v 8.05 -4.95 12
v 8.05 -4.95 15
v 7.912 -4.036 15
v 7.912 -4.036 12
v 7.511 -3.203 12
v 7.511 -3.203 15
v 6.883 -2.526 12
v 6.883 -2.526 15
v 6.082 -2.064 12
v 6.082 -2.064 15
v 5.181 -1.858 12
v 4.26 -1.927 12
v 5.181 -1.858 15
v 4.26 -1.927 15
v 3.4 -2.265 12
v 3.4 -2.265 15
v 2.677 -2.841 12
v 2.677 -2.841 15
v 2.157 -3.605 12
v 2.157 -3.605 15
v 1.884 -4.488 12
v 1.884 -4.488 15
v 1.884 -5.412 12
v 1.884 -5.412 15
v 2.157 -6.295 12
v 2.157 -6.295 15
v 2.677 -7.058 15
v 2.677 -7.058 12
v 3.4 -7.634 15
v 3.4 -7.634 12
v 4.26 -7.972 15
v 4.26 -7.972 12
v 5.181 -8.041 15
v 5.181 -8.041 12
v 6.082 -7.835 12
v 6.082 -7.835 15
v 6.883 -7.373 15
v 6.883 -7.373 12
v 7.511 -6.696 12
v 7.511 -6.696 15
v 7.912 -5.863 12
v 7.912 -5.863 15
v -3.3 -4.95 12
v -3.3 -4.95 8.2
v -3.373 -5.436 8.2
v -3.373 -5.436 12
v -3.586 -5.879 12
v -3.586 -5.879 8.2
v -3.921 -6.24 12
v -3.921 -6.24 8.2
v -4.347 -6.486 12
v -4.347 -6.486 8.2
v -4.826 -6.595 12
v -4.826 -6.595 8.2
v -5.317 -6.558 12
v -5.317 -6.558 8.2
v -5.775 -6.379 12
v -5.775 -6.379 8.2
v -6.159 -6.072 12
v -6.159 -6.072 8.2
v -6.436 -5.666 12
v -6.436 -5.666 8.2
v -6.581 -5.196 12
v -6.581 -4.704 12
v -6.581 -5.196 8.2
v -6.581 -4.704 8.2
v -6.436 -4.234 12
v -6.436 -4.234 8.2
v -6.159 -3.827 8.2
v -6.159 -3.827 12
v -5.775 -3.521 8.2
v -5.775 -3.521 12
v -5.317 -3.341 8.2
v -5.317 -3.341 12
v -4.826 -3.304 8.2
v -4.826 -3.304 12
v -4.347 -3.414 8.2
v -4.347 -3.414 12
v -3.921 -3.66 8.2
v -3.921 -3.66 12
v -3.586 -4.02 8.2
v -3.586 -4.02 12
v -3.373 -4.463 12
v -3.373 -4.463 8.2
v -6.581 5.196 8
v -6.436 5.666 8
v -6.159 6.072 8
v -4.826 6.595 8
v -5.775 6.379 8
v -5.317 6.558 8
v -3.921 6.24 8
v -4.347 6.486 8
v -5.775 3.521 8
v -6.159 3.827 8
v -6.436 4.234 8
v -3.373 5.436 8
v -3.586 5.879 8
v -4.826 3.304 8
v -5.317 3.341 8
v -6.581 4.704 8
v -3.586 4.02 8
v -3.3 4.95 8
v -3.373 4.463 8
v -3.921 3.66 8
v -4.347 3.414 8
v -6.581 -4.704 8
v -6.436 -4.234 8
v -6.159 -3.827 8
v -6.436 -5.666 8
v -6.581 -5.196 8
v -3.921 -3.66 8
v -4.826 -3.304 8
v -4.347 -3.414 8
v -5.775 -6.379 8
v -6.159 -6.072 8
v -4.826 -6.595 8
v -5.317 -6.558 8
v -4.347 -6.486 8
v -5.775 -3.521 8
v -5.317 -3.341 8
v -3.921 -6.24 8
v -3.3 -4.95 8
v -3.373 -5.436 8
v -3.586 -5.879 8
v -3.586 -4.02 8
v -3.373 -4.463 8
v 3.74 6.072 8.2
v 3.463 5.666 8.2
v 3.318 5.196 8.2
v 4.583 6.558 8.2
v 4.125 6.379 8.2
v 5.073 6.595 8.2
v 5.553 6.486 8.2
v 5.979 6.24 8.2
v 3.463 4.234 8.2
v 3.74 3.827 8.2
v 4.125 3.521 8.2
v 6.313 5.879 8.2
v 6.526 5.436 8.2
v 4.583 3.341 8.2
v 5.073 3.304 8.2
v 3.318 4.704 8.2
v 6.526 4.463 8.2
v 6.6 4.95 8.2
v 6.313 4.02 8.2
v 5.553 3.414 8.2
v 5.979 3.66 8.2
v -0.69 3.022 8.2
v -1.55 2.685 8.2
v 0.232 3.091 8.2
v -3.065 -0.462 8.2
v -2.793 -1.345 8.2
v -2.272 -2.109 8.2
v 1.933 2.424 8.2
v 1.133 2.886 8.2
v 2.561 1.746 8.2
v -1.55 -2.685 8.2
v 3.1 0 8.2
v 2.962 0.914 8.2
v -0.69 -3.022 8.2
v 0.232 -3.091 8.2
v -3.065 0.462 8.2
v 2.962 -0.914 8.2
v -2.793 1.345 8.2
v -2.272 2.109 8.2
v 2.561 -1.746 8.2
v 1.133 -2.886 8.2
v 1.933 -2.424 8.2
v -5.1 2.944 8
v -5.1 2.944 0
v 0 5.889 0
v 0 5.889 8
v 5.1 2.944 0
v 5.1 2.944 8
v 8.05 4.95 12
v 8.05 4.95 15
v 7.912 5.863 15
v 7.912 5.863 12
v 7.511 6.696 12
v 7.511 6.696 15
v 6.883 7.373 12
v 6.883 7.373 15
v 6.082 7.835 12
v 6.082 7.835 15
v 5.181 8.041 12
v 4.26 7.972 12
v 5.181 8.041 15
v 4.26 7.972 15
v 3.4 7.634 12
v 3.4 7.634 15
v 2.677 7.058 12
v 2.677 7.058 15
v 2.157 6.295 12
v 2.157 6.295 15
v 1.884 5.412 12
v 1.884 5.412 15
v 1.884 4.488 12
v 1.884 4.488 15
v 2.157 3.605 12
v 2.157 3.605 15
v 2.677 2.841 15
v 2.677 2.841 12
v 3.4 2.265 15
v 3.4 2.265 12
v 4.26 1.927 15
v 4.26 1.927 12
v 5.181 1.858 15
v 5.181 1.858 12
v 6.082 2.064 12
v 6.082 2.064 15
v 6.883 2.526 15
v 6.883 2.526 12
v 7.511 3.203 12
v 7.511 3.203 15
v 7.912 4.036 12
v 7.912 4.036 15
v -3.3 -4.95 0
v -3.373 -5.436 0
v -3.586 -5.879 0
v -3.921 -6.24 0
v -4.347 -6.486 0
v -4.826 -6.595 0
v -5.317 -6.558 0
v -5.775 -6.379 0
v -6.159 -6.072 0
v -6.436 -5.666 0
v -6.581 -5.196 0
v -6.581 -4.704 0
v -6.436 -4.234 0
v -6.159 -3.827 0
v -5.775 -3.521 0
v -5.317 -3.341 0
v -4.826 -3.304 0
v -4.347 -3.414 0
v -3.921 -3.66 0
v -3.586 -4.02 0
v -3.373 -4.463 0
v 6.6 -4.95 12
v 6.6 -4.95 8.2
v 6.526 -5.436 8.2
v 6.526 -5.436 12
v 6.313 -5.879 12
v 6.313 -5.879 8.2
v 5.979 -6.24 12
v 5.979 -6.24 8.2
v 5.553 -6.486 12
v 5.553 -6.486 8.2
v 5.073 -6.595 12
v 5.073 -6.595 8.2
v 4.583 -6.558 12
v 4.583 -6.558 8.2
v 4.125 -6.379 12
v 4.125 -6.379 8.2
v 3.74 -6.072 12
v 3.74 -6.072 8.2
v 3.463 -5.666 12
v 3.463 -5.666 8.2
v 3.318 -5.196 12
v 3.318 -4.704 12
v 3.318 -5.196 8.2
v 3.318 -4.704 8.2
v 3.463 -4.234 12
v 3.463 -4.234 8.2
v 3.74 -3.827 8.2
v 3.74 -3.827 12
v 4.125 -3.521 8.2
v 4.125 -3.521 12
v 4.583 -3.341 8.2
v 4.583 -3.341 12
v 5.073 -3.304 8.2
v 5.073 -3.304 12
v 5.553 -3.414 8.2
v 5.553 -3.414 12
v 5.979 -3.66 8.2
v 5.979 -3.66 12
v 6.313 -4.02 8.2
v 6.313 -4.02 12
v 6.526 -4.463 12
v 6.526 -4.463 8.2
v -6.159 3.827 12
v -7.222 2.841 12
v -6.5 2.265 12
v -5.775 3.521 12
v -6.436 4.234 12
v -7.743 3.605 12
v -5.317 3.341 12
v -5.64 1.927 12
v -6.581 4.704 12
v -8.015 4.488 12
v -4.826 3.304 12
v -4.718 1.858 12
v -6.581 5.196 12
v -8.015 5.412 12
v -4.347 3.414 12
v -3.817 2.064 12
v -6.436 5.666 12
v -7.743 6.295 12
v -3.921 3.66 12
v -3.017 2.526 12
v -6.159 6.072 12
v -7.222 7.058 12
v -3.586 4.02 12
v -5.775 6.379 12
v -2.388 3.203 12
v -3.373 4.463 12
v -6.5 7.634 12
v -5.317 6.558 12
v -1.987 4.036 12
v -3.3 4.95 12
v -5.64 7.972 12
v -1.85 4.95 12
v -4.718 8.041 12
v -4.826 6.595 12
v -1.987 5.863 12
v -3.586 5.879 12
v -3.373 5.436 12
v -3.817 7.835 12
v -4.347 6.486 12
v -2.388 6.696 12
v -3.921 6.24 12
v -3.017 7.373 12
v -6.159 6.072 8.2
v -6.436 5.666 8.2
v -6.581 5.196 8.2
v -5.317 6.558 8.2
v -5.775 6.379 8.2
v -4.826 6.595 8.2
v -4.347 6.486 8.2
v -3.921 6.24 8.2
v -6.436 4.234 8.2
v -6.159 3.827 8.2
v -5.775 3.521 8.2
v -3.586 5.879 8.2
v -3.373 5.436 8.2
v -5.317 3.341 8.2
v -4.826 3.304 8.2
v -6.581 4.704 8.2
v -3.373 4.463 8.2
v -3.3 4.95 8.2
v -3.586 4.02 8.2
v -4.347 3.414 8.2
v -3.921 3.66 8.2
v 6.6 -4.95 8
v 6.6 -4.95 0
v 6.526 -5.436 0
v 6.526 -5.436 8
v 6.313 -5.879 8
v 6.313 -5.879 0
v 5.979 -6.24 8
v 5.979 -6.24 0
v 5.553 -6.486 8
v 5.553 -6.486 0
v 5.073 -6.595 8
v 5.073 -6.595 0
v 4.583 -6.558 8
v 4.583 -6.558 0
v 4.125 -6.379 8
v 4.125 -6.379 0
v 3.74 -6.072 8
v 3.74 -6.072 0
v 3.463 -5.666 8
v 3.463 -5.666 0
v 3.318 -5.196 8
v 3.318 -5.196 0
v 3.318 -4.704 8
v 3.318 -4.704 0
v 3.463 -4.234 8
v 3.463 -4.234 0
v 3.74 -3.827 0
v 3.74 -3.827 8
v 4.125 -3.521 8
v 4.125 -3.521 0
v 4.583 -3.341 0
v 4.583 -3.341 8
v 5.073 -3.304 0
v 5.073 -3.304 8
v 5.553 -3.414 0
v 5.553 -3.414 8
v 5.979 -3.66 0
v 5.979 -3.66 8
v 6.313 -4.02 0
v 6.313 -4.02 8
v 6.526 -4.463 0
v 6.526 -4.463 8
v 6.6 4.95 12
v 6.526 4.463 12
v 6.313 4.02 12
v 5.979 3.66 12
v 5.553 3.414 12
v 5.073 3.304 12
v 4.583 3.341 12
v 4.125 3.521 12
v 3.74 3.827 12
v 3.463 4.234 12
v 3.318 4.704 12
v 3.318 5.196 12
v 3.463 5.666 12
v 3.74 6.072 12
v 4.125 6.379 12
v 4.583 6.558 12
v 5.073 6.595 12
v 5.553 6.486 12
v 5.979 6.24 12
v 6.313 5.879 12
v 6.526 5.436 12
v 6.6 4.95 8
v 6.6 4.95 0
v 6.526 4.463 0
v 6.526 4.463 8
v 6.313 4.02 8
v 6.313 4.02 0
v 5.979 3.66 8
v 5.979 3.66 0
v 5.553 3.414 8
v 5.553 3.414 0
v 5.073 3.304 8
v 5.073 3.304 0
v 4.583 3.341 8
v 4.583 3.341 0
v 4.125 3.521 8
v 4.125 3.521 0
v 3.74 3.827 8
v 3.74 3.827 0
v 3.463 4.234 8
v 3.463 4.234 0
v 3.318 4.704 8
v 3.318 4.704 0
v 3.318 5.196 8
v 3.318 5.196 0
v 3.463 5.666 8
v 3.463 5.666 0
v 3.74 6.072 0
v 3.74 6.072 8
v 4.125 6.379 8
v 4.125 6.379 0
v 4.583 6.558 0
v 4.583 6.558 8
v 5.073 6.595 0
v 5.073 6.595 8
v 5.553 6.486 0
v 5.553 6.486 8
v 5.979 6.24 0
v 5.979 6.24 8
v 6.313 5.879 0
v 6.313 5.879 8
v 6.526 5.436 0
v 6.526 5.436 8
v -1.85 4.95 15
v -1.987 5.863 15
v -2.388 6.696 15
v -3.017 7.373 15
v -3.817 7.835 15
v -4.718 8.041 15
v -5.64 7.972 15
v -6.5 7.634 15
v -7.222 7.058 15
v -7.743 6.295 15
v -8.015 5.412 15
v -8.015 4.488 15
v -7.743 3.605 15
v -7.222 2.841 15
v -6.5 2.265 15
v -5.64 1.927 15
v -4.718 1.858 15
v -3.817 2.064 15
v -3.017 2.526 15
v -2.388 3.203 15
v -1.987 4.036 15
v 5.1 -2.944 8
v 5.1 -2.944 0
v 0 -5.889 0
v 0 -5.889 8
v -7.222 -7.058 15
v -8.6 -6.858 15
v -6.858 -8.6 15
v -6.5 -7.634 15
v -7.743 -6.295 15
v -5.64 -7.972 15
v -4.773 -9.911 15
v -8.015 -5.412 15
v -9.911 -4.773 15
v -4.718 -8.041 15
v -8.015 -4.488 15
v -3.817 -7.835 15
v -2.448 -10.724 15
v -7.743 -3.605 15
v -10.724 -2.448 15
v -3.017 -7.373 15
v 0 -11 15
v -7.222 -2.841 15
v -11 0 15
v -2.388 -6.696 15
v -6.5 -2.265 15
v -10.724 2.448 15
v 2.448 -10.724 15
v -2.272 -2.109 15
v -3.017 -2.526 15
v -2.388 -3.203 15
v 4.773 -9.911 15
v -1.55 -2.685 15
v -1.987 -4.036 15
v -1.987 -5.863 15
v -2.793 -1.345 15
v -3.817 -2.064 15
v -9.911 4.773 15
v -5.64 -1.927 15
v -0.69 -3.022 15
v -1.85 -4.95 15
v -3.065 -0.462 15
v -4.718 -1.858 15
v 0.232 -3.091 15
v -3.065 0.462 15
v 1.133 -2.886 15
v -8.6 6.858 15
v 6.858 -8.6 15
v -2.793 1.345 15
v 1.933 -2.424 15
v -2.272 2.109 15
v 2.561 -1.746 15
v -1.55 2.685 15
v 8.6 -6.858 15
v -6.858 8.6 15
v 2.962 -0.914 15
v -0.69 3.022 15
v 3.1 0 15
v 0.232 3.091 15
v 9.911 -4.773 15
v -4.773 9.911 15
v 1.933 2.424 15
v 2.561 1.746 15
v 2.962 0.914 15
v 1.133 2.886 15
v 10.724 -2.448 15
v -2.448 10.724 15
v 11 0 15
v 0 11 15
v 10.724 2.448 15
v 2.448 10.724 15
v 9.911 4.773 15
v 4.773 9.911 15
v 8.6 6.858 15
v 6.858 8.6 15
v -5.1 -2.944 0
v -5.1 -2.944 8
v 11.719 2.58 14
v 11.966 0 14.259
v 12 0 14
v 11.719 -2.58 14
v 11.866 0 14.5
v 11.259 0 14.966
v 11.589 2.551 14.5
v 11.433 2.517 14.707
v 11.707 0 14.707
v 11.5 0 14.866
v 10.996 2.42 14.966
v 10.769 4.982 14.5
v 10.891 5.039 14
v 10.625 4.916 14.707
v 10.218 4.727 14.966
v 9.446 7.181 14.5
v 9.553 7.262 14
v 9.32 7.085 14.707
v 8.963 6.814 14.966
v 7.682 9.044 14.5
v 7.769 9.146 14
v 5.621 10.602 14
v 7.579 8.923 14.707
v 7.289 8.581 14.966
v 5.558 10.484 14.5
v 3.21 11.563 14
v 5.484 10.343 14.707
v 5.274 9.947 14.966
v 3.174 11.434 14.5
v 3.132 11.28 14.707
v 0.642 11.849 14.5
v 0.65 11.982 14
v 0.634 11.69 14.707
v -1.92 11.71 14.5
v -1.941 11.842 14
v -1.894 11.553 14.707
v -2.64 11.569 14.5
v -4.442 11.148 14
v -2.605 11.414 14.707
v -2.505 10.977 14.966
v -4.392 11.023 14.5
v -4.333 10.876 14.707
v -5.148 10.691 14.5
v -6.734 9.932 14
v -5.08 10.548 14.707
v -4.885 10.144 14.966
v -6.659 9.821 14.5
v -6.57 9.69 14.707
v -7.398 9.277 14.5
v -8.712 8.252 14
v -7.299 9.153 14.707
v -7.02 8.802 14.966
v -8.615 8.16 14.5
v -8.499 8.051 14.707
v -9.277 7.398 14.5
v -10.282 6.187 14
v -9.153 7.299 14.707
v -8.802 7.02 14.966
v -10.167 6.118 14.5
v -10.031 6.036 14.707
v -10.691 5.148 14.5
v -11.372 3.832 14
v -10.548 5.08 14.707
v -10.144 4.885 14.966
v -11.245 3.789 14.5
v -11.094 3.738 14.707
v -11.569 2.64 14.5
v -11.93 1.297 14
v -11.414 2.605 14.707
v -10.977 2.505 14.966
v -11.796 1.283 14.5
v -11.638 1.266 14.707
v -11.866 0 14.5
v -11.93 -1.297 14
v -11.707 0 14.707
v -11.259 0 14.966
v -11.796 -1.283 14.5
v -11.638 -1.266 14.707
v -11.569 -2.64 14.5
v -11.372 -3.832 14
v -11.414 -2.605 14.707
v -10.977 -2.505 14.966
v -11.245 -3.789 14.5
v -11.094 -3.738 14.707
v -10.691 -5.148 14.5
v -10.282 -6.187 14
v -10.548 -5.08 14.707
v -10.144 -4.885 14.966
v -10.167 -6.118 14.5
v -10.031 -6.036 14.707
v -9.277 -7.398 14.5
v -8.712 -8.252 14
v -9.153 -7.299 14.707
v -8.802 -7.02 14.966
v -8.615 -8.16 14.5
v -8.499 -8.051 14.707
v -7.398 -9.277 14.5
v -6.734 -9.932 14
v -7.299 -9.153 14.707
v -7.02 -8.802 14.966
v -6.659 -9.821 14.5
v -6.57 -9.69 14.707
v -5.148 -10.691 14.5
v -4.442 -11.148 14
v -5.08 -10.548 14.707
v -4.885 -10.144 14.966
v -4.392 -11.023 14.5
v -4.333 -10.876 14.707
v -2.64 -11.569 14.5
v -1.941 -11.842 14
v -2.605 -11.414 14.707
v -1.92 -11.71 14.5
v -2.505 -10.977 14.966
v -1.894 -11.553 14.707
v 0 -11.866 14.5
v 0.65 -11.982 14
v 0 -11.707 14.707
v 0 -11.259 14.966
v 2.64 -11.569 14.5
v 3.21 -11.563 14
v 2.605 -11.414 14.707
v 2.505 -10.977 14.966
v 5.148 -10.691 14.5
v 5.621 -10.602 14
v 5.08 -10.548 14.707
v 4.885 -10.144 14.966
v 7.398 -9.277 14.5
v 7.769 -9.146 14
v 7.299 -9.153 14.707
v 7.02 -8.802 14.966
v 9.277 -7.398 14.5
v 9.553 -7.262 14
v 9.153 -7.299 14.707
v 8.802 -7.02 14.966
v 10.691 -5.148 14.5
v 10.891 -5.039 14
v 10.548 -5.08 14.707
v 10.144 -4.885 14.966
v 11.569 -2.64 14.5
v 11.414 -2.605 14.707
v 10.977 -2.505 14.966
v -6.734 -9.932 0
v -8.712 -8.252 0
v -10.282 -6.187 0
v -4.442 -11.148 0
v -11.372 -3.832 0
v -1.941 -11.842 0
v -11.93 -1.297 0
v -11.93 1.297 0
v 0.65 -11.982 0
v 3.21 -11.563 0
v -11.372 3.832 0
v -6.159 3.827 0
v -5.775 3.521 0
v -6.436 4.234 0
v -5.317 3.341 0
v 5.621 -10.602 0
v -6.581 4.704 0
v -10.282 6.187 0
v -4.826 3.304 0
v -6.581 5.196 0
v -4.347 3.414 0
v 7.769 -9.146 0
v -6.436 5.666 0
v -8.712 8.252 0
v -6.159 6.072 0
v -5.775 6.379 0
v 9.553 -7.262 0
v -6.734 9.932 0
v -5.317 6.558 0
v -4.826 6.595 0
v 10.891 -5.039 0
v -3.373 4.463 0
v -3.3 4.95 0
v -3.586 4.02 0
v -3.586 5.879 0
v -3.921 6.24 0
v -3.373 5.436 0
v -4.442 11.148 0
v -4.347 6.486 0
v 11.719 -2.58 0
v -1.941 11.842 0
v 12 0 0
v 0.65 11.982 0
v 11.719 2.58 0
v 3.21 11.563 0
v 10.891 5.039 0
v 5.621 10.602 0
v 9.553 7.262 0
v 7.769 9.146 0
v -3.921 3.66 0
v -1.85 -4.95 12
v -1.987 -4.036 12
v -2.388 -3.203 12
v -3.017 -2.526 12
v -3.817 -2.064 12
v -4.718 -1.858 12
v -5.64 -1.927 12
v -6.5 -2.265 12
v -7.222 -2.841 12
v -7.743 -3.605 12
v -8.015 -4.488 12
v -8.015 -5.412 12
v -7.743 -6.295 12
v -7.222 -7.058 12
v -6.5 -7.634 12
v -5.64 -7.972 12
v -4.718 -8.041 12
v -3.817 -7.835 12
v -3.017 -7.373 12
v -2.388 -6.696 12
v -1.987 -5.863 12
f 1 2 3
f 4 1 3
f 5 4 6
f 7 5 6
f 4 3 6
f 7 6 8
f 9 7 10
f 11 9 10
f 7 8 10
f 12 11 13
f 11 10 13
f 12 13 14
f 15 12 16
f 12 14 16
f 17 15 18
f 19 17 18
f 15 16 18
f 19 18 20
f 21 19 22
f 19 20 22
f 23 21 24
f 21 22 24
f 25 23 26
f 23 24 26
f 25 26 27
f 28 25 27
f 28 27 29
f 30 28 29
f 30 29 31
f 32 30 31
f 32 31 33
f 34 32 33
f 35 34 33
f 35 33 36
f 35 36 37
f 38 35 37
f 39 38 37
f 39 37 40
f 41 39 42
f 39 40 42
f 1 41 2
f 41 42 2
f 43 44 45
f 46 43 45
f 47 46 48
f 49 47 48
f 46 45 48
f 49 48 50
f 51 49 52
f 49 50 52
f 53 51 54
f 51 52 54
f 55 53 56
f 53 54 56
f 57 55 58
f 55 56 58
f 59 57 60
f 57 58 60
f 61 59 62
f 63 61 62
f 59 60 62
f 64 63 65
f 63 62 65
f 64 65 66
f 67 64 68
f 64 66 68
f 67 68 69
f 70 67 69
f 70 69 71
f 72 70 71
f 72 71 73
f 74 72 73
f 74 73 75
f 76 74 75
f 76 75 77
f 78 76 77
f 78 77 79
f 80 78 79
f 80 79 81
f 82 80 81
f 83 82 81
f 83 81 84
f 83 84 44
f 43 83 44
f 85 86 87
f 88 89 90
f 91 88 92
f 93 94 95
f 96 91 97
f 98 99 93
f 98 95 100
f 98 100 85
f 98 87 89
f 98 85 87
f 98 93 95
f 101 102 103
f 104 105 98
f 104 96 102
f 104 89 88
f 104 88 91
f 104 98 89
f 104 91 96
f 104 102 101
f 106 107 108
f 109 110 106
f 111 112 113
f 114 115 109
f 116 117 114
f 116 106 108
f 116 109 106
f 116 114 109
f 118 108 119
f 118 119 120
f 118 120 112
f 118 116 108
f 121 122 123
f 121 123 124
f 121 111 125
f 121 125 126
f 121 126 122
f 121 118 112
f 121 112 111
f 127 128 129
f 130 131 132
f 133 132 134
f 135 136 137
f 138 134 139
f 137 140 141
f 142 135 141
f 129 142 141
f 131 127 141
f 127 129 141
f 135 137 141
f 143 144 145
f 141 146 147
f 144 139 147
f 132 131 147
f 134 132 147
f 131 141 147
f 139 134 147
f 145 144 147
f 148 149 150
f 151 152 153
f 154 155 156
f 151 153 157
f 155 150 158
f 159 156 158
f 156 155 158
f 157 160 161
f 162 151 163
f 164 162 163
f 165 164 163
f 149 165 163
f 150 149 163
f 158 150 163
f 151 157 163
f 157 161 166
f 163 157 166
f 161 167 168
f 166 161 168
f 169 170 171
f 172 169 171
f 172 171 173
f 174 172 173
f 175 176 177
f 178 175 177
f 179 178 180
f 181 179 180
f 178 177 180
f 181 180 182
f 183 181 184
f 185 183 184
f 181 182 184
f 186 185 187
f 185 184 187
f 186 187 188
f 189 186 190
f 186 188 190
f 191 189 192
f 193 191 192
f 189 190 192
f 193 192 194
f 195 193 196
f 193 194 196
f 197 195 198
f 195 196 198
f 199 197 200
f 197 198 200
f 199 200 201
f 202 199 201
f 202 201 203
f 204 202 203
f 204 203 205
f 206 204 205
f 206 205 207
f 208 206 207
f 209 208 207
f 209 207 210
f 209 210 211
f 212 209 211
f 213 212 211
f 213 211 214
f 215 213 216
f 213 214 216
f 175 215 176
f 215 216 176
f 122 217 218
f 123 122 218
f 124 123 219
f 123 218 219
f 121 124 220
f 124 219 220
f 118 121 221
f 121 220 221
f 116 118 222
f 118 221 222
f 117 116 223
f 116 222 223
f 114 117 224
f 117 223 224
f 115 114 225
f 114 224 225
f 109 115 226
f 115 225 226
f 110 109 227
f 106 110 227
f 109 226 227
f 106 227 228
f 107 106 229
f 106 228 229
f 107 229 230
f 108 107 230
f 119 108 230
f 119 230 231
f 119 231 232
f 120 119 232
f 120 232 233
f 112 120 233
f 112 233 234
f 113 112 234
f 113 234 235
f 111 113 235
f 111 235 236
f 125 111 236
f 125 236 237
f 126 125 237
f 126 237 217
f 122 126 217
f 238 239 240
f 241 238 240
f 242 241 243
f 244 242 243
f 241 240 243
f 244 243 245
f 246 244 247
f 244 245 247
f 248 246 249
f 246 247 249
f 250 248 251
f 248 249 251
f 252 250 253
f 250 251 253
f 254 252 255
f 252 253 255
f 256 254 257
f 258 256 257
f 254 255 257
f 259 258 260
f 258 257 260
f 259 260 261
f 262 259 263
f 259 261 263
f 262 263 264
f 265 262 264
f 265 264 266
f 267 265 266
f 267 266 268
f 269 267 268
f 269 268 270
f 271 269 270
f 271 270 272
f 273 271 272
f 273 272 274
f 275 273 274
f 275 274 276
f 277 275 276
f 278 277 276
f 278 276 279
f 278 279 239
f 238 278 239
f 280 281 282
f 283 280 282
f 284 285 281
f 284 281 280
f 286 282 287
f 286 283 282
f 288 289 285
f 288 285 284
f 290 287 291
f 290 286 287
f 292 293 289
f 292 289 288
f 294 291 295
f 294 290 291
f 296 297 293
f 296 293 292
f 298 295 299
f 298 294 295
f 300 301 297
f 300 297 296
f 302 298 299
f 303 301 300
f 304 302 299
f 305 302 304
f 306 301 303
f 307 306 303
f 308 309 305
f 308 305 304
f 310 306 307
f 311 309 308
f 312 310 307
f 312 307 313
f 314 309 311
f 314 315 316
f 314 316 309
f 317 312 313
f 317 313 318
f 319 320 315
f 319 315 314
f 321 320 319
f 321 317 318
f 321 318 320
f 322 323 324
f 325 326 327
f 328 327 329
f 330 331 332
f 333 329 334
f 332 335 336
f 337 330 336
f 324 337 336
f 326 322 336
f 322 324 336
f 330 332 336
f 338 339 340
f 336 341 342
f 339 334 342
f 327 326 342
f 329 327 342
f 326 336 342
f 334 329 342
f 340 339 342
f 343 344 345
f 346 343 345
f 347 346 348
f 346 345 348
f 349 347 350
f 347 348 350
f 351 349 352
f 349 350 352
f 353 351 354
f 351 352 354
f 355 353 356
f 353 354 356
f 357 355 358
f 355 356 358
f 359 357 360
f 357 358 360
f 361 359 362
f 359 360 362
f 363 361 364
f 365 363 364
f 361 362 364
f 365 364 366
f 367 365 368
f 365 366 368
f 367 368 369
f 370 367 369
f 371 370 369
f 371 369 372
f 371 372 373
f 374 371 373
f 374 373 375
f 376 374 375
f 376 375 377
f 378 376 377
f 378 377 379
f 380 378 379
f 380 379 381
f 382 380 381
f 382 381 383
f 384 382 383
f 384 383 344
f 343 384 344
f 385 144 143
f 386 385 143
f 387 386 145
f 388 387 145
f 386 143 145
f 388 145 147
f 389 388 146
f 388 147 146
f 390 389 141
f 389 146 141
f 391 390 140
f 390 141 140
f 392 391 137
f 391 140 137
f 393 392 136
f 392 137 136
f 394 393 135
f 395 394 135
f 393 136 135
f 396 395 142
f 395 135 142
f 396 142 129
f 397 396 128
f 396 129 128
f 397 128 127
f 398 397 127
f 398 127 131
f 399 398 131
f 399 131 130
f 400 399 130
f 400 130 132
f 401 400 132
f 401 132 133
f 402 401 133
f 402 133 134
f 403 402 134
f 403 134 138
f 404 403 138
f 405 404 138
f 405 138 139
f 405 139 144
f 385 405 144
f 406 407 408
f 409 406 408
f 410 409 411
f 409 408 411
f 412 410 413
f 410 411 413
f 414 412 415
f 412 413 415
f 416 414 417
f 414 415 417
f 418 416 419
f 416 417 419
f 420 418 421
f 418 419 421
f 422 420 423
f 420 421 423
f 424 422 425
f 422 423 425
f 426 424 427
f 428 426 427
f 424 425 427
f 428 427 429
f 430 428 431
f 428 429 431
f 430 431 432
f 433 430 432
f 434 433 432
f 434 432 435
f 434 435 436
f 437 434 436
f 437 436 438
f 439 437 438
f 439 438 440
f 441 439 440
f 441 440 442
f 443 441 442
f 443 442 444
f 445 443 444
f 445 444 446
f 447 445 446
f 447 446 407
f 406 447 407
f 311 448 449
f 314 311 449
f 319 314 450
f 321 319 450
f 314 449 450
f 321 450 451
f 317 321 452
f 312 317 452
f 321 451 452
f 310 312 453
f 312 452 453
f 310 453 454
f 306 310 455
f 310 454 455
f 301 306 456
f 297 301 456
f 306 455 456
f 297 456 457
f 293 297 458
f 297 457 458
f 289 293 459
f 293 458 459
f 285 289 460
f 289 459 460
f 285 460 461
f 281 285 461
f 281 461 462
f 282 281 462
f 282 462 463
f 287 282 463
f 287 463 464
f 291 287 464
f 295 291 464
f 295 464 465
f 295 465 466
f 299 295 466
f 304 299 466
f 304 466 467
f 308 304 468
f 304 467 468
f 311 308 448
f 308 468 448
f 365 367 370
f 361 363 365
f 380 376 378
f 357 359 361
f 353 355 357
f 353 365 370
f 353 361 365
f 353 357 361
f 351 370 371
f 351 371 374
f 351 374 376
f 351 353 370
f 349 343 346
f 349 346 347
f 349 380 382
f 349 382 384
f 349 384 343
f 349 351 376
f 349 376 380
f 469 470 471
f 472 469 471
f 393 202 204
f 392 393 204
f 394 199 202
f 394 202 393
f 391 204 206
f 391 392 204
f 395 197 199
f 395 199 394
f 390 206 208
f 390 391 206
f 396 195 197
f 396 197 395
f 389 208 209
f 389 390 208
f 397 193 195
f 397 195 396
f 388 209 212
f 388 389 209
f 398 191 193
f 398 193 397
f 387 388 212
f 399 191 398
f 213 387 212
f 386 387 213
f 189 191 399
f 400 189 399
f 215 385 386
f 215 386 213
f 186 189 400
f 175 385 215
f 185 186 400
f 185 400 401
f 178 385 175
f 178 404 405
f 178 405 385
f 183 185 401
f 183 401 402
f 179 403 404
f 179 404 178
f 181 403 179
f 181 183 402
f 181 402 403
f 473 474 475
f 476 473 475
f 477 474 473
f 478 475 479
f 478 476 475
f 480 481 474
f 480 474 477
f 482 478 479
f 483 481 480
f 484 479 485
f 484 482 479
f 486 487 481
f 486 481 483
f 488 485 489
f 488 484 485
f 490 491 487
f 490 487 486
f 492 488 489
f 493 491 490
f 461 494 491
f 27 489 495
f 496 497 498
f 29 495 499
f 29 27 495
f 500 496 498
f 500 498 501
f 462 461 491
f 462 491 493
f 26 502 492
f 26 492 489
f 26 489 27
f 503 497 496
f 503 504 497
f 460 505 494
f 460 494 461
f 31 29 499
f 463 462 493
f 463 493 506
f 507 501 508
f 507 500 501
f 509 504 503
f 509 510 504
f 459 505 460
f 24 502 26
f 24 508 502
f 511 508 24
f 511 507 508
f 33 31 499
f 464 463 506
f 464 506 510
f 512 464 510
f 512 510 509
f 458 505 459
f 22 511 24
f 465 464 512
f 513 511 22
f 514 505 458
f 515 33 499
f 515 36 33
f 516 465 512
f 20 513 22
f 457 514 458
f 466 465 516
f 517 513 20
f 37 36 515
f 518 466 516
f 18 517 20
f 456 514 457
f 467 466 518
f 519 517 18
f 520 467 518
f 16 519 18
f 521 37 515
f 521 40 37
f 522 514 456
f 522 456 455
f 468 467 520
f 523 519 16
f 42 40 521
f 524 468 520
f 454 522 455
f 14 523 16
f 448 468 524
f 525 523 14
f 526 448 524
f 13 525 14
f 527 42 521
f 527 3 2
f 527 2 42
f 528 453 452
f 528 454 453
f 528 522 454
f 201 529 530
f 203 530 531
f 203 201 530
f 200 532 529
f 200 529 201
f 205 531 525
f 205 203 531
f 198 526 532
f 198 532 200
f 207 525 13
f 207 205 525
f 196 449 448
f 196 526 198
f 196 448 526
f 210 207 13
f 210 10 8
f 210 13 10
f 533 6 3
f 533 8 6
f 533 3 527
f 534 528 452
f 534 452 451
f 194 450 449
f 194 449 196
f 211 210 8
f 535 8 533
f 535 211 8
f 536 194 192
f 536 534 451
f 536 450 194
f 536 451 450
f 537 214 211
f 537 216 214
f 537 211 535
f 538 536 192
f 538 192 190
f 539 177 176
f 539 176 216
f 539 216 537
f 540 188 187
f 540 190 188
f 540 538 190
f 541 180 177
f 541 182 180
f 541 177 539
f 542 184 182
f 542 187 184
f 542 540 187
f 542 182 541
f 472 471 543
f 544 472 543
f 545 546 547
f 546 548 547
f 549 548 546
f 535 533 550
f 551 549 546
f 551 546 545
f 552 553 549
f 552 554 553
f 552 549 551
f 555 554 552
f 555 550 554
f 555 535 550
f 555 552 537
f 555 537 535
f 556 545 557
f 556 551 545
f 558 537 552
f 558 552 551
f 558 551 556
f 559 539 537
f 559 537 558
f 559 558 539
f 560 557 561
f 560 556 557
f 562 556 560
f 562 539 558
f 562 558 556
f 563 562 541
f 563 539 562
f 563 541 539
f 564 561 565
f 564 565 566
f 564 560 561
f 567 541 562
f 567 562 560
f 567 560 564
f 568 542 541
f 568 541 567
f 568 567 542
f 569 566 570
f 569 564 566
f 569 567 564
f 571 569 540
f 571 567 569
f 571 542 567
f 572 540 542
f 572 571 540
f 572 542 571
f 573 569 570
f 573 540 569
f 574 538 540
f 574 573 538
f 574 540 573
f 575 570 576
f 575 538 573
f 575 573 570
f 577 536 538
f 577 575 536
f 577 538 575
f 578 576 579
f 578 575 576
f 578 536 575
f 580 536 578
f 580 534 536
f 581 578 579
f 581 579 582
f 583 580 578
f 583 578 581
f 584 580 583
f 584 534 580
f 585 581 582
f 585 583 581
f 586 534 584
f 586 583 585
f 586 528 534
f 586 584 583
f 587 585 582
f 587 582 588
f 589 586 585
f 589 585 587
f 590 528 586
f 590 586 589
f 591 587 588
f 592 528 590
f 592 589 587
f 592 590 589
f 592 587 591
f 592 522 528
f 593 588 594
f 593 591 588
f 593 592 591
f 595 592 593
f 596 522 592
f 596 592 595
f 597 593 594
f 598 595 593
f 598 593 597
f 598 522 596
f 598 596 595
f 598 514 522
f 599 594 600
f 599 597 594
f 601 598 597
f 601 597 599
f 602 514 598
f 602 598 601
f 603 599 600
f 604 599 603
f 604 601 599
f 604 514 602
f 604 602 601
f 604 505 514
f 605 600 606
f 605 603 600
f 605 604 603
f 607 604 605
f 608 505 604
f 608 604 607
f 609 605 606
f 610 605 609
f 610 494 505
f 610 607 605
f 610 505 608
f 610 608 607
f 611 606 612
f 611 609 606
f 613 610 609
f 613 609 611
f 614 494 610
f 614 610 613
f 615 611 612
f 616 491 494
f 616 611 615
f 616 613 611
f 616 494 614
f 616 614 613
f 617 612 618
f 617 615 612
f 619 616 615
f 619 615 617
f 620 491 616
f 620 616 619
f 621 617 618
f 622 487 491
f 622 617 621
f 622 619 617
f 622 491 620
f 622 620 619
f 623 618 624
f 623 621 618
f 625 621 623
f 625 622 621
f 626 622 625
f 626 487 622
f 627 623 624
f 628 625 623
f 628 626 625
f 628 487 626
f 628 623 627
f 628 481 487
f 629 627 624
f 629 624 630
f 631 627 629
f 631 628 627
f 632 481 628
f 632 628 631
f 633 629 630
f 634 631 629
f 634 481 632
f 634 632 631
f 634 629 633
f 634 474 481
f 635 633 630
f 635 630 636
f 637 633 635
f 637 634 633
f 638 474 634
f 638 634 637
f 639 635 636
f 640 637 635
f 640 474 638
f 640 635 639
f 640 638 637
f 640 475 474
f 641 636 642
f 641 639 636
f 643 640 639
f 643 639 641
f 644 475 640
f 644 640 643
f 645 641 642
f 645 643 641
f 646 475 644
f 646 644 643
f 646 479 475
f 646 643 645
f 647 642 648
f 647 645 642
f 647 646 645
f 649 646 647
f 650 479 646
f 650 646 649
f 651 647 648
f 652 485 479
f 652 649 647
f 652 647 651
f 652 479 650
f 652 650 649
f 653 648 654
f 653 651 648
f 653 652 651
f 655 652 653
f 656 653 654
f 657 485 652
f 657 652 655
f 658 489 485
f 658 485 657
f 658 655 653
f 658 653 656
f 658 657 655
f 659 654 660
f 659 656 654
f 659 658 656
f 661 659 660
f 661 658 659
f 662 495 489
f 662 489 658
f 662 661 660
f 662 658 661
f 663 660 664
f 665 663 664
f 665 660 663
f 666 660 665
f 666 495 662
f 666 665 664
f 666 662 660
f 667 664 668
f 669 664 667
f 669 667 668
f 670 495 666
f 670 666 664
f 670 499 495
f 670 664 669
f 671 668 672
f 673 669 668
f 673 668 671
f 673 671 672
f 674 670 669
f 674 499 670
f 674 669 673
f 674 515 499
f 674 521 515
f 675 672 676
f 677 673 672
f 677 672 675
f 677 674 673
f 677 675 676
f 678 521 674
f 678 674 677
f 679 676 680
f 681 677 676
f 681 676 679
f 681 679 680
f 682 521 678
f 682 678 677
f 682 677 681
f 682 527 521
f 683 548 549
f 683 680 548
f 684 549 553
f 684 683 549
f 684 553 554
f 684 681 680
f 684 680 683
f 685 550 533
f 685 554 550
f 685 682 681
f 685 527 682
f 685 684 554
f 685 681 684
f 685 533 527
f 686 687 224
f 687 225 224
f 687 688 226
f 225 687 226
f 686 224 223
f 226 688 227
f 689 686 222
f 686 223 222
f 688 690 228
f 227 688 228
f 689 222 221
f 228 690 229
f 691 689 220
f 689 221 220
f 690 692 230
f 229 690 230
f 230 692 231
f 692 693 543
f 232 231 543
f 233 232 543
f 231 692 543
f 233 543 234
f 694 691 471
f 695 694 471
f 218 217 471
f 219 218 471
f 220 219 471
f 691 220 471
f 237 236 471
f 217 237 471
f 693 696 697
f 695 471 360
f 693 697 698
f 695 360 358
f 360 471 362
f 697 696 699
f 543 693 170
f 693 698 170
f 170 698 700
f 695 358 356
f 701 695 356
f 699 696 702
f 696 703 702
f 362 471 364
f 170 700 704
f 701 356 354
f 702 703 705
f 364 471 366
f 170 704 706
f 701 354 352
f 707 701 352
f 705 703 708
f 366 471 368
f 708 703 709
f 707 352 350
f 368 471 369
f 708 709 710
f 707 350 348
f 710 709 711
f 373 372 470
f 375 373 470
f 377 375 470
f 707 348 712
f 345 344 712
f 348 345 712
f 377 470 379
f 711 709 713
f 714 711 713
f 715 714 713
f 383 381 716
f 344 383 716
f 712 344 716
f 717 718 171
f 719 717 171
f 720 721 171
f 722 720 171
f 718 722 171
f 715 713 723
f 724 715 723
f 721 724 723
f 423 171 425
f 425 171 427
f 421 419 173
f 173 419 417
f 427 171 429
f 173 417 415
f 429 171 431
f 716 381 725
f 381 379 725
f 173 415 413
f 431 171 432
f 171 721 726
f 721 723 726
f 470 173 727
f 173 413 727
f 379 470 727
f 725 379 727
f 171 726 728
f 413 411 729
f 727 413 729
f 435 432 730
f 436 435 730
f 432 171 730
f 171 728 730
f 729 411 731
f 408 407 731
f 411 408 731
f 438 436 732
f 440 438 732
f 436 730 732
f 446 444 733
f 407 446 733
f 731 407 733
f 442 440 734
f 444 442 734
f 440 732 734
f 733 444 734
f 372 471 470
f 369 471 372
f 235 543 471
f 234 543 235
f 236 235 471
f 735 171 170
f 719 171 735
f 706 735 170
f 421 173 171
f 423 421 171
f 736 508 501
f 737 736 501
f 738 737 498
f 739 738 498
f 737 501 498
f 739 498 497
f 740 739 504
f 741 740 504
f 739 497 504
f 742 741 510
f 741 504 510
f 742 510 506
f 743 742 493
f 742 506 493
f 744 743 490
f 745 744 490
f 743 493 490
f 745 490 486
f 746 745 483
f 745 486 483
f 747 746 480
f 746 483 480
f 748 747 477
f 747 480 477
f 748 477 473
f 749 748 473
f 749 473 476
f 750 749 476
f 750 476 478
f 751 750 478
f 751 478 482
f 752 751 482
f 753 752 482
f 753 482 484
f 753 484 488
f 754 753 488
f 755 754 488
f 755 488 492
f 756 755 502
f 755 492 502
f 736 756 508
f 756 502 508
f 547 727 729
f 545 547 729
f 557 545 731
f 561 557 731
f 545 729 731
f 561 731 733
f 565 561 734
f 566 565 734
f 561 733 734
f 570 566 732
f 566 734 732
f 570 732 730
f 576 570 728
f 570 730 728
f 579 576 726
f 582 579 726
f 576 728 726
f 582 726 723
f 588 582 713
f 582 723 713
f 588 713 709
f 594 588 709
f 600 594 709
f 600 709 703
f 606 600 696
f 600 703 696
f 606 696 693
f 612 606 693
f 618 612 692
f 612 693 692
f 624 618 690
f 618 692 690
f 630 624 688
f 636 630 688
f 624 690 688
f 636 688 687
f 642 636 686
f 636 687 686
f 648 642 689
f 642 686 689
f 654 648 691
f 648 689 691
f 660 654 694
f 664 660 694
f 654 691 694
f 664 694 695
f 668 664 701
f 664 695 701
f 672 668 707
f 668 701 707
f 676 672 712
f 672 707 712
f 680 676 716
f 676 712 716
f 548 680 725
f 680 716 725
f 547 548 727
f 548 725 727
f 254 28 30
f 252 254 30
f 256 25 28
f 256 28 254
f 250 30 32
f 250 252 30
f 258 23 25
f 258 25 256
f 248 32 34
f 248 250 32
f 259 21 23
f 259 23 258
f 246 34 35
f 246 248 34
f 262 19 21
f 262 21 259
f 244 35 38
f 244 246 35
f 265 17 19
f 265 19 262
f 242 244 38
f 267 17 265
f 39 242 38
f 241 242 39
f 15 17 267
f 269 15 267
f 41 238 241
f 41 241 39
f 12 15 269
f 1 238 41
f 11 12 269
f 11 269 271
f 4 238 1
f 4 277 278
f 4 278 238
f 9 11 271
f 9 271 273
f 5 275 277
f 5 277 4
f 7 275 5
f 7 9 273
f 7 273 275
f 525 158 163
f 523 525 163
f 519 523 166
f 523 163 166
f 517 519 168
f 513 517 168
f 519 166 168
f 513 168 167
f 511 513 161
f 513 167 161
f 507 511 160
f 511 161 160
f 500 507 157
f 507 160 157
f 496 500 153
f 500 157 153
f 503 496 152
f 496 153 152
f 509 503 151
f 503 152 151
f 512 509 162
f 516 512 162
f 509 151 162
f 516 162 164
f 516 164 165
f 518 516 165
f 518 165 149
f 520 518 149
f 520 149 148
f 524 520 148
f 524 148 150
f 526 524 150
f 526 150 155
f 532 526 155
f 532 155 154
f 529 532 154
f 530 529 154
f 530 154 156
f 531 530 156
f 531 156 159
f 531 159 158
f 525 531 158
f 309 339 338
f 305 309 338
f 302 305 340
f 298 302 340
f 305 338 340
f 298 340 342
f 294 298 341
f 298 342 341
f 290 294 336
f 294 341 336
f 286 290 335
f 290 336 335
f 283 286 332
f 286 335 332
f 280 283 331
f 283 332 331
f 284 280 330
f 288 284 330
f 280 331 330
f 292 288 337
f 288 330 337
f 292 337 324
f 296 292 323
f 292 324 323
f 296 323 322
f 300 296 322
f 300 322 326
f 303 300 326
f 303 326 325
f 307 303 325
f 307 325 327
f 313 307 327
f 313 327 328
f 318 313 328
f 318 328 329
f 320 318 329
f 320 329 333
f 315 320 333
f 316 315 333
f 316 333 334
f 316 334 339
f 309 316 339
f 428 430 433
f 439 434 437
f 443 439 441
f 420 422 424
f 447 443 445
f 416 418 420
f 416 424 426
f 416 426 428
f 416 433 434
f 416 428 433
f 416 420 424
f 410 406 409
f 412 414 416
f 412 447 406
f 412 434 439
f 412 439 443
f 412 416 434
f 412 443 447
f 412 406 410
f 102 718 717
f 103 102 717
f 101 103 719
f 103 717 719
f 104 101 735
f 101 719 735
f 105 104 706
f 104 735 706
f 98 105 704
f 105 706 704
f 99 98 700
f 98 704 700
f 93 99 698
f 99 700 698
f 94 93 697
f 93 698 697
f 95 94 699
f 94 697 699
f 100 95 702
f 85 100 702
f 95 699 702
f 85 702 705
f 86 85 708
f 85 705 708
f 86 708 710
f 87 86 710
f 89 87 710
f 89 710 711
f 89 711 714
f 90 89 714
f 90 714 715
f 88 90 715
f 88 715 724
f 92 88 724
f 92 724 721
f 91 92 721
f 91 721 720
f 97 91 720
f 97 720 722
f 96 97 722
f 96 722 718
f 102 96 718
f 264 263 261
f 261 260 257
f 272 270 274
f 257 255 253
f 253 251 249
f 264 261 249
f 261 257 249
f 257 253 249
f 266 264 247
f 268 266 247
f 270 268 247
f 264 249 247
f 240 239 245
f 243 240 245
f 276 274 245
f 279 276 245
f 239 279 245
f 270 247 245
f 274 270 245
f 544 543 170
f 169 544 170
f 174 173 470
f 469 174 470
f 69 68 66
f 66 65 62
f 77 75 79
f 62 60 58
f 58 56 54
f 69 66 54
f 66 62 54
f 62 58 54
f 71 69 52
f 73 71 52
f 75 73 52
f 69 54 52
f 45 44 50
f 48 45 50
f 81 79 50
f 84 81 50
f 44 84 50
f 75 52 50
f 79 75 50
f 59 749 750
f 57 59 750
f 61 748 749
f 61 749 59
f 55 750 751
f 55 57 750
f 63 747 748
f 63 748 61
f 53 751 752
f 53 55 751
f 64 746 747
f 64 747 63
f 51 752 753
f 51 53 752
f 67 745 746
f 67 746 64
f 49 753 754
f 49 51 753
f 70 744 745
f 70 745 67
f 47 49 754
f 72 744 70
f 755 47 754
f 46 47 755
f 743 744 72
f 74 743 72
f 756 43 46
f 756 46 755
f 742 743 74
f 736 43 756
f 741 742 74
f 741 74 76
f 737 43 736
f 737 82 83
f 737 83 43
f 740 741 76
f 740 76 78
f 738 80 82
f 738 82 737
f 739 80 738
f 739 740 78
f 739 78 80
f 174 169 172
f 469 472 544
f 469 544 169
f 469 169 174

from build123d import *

# Parameters (mm, degrees)
SKETCH_R        = 12
PAD_DEPTH       = 15
SKETCH001_R     = 1.65
POCKET_DEPTH    = 15.001
POCKET001_DEPTH = 8
SKETCH003_R     = 3.1
POCKET002_DEPTH = 7.001
SKETCH004_R     = 3.1
PAD001_DEPTH    = 0.2
SKETCH005_R     = 3.1
POCKET003_DEPTH = 3
FILLET_R        = 1
SKETCH006_R     = 1.65
PAD002_DEPTH    = 0.2


with BuildPart() as part:
    # Sketch → Pad (new body)
    with BuildSketch(Plane.XY):
        Circle(SKETCH_R)
    extrude(amount=PAD_DEPTH)

    # Sketch001 (on Face2 of Pad) → Pocket (cut, through all)
    with BuildSketch(Plane(origin=(0, 0, 0), x_dir=(1, 0, 0), z_dir=(0, 0, -1))):
        with Locations((-4.949747, 4.949747)):
            Circle(SKETCH001_R)
        with Locations((4.949747, 4.949747)):
            Circle(SKETCH001_R)
        with Locations((4.949747, -4.949747)):
            Circle(SKETCH001_R)
        with Locations((-4.949747, -4.949747)):
            Circle(SKETCH001_R)
    extrude(amount=-POCKET_DEPTH, mode=Mode.SUBTRACT)

    # Sketch002 (on Face2 of Pocket) → Pocket001 (cut)
    with BuildSketch(Plane(origin=(0, 0, 0), x_dir=(1, 0, 0), z_dir=(0, 0, -1))):
        Polygon((5.1, 2.944486), (0, 5.888973), (-5.1, 2.944486), (-5.1, -2.944486), (0, -5.888973), (5.1, -2.944486), align=None)
    extrude(amount=-POCKET001_DEPTH, mode=Mode.SUBTRACT)

    # Sketch003 (on Face14 of Pocket001) → Pocket002 (cut, through all)
    with BuildSketch(Plane(origin=(0, 0, 8), x_dir=(1, 0, 0), z_dir=(0, 0, -1))):
        Circle(SKETCH003_R)
    extrude(amount=-POCKET002_DEPTH, mode=Mode.SUBTRACT)

    # Sketch004 (on Face15 of Pocket002) → Pad001 (join)
    with BuildSketch(Plane(origin=(0, 0, 8), x_dir=(1, 0, 0), z_dir=(0, 0, -1))):
        Circle(SKETCH004_R)
    extrude(amount=-PAD001_DEPTH)

    # Sketch005 (on Face3 of Pad001) → Pocket003 (cut)
    with BuildSketch(Plane.XY.offset(15)):
        with Locations((4.949747, 4.949747)):
            Circle(SKETCH005_R)
        with Locations((4.949747, -4.949747)):
            Circle(SKETCH005_R)
        with Locations((-4.949747, -4.949747)):
            Circle(SKETCH005_R)
        with Locations((-4.949747, 4.949747)):
            Circle(SKETCH005_R)
    extrude(amount=-POCKET003_DEPTH, mode=Mode.SUBTRACT)

    # Fillet
    fillet_edges = [part.edges().sort_by_distance(p)[0] for p in [
        (-12, 0, 15),
    ]]
    fillet(fillet_edges, radius=FILLET_R)

    # Sketch006 (on Face22 of Fillet) → Pad002 (join)
    with BuildSketch(Plane(origin=(0, 0, 8), x_dir=(1, 0, 0), z_dir=(0, 0, -1))):
        with Locations((-4.949747, 4.949747)):
            Circle(SKETCH006_R)
        with Locations((4.949747, 4.949747)):
            Circle(SKETCH006_R)
        with Locations((4.949747, -4.949747)):
            Circle(SKETCH006_R)
        with Locations((-4.949747, -4.949747)):
            Circle(SKETCH006_R)
    extrude(amount=-PAD002_DEPTH)


solid = part.part
